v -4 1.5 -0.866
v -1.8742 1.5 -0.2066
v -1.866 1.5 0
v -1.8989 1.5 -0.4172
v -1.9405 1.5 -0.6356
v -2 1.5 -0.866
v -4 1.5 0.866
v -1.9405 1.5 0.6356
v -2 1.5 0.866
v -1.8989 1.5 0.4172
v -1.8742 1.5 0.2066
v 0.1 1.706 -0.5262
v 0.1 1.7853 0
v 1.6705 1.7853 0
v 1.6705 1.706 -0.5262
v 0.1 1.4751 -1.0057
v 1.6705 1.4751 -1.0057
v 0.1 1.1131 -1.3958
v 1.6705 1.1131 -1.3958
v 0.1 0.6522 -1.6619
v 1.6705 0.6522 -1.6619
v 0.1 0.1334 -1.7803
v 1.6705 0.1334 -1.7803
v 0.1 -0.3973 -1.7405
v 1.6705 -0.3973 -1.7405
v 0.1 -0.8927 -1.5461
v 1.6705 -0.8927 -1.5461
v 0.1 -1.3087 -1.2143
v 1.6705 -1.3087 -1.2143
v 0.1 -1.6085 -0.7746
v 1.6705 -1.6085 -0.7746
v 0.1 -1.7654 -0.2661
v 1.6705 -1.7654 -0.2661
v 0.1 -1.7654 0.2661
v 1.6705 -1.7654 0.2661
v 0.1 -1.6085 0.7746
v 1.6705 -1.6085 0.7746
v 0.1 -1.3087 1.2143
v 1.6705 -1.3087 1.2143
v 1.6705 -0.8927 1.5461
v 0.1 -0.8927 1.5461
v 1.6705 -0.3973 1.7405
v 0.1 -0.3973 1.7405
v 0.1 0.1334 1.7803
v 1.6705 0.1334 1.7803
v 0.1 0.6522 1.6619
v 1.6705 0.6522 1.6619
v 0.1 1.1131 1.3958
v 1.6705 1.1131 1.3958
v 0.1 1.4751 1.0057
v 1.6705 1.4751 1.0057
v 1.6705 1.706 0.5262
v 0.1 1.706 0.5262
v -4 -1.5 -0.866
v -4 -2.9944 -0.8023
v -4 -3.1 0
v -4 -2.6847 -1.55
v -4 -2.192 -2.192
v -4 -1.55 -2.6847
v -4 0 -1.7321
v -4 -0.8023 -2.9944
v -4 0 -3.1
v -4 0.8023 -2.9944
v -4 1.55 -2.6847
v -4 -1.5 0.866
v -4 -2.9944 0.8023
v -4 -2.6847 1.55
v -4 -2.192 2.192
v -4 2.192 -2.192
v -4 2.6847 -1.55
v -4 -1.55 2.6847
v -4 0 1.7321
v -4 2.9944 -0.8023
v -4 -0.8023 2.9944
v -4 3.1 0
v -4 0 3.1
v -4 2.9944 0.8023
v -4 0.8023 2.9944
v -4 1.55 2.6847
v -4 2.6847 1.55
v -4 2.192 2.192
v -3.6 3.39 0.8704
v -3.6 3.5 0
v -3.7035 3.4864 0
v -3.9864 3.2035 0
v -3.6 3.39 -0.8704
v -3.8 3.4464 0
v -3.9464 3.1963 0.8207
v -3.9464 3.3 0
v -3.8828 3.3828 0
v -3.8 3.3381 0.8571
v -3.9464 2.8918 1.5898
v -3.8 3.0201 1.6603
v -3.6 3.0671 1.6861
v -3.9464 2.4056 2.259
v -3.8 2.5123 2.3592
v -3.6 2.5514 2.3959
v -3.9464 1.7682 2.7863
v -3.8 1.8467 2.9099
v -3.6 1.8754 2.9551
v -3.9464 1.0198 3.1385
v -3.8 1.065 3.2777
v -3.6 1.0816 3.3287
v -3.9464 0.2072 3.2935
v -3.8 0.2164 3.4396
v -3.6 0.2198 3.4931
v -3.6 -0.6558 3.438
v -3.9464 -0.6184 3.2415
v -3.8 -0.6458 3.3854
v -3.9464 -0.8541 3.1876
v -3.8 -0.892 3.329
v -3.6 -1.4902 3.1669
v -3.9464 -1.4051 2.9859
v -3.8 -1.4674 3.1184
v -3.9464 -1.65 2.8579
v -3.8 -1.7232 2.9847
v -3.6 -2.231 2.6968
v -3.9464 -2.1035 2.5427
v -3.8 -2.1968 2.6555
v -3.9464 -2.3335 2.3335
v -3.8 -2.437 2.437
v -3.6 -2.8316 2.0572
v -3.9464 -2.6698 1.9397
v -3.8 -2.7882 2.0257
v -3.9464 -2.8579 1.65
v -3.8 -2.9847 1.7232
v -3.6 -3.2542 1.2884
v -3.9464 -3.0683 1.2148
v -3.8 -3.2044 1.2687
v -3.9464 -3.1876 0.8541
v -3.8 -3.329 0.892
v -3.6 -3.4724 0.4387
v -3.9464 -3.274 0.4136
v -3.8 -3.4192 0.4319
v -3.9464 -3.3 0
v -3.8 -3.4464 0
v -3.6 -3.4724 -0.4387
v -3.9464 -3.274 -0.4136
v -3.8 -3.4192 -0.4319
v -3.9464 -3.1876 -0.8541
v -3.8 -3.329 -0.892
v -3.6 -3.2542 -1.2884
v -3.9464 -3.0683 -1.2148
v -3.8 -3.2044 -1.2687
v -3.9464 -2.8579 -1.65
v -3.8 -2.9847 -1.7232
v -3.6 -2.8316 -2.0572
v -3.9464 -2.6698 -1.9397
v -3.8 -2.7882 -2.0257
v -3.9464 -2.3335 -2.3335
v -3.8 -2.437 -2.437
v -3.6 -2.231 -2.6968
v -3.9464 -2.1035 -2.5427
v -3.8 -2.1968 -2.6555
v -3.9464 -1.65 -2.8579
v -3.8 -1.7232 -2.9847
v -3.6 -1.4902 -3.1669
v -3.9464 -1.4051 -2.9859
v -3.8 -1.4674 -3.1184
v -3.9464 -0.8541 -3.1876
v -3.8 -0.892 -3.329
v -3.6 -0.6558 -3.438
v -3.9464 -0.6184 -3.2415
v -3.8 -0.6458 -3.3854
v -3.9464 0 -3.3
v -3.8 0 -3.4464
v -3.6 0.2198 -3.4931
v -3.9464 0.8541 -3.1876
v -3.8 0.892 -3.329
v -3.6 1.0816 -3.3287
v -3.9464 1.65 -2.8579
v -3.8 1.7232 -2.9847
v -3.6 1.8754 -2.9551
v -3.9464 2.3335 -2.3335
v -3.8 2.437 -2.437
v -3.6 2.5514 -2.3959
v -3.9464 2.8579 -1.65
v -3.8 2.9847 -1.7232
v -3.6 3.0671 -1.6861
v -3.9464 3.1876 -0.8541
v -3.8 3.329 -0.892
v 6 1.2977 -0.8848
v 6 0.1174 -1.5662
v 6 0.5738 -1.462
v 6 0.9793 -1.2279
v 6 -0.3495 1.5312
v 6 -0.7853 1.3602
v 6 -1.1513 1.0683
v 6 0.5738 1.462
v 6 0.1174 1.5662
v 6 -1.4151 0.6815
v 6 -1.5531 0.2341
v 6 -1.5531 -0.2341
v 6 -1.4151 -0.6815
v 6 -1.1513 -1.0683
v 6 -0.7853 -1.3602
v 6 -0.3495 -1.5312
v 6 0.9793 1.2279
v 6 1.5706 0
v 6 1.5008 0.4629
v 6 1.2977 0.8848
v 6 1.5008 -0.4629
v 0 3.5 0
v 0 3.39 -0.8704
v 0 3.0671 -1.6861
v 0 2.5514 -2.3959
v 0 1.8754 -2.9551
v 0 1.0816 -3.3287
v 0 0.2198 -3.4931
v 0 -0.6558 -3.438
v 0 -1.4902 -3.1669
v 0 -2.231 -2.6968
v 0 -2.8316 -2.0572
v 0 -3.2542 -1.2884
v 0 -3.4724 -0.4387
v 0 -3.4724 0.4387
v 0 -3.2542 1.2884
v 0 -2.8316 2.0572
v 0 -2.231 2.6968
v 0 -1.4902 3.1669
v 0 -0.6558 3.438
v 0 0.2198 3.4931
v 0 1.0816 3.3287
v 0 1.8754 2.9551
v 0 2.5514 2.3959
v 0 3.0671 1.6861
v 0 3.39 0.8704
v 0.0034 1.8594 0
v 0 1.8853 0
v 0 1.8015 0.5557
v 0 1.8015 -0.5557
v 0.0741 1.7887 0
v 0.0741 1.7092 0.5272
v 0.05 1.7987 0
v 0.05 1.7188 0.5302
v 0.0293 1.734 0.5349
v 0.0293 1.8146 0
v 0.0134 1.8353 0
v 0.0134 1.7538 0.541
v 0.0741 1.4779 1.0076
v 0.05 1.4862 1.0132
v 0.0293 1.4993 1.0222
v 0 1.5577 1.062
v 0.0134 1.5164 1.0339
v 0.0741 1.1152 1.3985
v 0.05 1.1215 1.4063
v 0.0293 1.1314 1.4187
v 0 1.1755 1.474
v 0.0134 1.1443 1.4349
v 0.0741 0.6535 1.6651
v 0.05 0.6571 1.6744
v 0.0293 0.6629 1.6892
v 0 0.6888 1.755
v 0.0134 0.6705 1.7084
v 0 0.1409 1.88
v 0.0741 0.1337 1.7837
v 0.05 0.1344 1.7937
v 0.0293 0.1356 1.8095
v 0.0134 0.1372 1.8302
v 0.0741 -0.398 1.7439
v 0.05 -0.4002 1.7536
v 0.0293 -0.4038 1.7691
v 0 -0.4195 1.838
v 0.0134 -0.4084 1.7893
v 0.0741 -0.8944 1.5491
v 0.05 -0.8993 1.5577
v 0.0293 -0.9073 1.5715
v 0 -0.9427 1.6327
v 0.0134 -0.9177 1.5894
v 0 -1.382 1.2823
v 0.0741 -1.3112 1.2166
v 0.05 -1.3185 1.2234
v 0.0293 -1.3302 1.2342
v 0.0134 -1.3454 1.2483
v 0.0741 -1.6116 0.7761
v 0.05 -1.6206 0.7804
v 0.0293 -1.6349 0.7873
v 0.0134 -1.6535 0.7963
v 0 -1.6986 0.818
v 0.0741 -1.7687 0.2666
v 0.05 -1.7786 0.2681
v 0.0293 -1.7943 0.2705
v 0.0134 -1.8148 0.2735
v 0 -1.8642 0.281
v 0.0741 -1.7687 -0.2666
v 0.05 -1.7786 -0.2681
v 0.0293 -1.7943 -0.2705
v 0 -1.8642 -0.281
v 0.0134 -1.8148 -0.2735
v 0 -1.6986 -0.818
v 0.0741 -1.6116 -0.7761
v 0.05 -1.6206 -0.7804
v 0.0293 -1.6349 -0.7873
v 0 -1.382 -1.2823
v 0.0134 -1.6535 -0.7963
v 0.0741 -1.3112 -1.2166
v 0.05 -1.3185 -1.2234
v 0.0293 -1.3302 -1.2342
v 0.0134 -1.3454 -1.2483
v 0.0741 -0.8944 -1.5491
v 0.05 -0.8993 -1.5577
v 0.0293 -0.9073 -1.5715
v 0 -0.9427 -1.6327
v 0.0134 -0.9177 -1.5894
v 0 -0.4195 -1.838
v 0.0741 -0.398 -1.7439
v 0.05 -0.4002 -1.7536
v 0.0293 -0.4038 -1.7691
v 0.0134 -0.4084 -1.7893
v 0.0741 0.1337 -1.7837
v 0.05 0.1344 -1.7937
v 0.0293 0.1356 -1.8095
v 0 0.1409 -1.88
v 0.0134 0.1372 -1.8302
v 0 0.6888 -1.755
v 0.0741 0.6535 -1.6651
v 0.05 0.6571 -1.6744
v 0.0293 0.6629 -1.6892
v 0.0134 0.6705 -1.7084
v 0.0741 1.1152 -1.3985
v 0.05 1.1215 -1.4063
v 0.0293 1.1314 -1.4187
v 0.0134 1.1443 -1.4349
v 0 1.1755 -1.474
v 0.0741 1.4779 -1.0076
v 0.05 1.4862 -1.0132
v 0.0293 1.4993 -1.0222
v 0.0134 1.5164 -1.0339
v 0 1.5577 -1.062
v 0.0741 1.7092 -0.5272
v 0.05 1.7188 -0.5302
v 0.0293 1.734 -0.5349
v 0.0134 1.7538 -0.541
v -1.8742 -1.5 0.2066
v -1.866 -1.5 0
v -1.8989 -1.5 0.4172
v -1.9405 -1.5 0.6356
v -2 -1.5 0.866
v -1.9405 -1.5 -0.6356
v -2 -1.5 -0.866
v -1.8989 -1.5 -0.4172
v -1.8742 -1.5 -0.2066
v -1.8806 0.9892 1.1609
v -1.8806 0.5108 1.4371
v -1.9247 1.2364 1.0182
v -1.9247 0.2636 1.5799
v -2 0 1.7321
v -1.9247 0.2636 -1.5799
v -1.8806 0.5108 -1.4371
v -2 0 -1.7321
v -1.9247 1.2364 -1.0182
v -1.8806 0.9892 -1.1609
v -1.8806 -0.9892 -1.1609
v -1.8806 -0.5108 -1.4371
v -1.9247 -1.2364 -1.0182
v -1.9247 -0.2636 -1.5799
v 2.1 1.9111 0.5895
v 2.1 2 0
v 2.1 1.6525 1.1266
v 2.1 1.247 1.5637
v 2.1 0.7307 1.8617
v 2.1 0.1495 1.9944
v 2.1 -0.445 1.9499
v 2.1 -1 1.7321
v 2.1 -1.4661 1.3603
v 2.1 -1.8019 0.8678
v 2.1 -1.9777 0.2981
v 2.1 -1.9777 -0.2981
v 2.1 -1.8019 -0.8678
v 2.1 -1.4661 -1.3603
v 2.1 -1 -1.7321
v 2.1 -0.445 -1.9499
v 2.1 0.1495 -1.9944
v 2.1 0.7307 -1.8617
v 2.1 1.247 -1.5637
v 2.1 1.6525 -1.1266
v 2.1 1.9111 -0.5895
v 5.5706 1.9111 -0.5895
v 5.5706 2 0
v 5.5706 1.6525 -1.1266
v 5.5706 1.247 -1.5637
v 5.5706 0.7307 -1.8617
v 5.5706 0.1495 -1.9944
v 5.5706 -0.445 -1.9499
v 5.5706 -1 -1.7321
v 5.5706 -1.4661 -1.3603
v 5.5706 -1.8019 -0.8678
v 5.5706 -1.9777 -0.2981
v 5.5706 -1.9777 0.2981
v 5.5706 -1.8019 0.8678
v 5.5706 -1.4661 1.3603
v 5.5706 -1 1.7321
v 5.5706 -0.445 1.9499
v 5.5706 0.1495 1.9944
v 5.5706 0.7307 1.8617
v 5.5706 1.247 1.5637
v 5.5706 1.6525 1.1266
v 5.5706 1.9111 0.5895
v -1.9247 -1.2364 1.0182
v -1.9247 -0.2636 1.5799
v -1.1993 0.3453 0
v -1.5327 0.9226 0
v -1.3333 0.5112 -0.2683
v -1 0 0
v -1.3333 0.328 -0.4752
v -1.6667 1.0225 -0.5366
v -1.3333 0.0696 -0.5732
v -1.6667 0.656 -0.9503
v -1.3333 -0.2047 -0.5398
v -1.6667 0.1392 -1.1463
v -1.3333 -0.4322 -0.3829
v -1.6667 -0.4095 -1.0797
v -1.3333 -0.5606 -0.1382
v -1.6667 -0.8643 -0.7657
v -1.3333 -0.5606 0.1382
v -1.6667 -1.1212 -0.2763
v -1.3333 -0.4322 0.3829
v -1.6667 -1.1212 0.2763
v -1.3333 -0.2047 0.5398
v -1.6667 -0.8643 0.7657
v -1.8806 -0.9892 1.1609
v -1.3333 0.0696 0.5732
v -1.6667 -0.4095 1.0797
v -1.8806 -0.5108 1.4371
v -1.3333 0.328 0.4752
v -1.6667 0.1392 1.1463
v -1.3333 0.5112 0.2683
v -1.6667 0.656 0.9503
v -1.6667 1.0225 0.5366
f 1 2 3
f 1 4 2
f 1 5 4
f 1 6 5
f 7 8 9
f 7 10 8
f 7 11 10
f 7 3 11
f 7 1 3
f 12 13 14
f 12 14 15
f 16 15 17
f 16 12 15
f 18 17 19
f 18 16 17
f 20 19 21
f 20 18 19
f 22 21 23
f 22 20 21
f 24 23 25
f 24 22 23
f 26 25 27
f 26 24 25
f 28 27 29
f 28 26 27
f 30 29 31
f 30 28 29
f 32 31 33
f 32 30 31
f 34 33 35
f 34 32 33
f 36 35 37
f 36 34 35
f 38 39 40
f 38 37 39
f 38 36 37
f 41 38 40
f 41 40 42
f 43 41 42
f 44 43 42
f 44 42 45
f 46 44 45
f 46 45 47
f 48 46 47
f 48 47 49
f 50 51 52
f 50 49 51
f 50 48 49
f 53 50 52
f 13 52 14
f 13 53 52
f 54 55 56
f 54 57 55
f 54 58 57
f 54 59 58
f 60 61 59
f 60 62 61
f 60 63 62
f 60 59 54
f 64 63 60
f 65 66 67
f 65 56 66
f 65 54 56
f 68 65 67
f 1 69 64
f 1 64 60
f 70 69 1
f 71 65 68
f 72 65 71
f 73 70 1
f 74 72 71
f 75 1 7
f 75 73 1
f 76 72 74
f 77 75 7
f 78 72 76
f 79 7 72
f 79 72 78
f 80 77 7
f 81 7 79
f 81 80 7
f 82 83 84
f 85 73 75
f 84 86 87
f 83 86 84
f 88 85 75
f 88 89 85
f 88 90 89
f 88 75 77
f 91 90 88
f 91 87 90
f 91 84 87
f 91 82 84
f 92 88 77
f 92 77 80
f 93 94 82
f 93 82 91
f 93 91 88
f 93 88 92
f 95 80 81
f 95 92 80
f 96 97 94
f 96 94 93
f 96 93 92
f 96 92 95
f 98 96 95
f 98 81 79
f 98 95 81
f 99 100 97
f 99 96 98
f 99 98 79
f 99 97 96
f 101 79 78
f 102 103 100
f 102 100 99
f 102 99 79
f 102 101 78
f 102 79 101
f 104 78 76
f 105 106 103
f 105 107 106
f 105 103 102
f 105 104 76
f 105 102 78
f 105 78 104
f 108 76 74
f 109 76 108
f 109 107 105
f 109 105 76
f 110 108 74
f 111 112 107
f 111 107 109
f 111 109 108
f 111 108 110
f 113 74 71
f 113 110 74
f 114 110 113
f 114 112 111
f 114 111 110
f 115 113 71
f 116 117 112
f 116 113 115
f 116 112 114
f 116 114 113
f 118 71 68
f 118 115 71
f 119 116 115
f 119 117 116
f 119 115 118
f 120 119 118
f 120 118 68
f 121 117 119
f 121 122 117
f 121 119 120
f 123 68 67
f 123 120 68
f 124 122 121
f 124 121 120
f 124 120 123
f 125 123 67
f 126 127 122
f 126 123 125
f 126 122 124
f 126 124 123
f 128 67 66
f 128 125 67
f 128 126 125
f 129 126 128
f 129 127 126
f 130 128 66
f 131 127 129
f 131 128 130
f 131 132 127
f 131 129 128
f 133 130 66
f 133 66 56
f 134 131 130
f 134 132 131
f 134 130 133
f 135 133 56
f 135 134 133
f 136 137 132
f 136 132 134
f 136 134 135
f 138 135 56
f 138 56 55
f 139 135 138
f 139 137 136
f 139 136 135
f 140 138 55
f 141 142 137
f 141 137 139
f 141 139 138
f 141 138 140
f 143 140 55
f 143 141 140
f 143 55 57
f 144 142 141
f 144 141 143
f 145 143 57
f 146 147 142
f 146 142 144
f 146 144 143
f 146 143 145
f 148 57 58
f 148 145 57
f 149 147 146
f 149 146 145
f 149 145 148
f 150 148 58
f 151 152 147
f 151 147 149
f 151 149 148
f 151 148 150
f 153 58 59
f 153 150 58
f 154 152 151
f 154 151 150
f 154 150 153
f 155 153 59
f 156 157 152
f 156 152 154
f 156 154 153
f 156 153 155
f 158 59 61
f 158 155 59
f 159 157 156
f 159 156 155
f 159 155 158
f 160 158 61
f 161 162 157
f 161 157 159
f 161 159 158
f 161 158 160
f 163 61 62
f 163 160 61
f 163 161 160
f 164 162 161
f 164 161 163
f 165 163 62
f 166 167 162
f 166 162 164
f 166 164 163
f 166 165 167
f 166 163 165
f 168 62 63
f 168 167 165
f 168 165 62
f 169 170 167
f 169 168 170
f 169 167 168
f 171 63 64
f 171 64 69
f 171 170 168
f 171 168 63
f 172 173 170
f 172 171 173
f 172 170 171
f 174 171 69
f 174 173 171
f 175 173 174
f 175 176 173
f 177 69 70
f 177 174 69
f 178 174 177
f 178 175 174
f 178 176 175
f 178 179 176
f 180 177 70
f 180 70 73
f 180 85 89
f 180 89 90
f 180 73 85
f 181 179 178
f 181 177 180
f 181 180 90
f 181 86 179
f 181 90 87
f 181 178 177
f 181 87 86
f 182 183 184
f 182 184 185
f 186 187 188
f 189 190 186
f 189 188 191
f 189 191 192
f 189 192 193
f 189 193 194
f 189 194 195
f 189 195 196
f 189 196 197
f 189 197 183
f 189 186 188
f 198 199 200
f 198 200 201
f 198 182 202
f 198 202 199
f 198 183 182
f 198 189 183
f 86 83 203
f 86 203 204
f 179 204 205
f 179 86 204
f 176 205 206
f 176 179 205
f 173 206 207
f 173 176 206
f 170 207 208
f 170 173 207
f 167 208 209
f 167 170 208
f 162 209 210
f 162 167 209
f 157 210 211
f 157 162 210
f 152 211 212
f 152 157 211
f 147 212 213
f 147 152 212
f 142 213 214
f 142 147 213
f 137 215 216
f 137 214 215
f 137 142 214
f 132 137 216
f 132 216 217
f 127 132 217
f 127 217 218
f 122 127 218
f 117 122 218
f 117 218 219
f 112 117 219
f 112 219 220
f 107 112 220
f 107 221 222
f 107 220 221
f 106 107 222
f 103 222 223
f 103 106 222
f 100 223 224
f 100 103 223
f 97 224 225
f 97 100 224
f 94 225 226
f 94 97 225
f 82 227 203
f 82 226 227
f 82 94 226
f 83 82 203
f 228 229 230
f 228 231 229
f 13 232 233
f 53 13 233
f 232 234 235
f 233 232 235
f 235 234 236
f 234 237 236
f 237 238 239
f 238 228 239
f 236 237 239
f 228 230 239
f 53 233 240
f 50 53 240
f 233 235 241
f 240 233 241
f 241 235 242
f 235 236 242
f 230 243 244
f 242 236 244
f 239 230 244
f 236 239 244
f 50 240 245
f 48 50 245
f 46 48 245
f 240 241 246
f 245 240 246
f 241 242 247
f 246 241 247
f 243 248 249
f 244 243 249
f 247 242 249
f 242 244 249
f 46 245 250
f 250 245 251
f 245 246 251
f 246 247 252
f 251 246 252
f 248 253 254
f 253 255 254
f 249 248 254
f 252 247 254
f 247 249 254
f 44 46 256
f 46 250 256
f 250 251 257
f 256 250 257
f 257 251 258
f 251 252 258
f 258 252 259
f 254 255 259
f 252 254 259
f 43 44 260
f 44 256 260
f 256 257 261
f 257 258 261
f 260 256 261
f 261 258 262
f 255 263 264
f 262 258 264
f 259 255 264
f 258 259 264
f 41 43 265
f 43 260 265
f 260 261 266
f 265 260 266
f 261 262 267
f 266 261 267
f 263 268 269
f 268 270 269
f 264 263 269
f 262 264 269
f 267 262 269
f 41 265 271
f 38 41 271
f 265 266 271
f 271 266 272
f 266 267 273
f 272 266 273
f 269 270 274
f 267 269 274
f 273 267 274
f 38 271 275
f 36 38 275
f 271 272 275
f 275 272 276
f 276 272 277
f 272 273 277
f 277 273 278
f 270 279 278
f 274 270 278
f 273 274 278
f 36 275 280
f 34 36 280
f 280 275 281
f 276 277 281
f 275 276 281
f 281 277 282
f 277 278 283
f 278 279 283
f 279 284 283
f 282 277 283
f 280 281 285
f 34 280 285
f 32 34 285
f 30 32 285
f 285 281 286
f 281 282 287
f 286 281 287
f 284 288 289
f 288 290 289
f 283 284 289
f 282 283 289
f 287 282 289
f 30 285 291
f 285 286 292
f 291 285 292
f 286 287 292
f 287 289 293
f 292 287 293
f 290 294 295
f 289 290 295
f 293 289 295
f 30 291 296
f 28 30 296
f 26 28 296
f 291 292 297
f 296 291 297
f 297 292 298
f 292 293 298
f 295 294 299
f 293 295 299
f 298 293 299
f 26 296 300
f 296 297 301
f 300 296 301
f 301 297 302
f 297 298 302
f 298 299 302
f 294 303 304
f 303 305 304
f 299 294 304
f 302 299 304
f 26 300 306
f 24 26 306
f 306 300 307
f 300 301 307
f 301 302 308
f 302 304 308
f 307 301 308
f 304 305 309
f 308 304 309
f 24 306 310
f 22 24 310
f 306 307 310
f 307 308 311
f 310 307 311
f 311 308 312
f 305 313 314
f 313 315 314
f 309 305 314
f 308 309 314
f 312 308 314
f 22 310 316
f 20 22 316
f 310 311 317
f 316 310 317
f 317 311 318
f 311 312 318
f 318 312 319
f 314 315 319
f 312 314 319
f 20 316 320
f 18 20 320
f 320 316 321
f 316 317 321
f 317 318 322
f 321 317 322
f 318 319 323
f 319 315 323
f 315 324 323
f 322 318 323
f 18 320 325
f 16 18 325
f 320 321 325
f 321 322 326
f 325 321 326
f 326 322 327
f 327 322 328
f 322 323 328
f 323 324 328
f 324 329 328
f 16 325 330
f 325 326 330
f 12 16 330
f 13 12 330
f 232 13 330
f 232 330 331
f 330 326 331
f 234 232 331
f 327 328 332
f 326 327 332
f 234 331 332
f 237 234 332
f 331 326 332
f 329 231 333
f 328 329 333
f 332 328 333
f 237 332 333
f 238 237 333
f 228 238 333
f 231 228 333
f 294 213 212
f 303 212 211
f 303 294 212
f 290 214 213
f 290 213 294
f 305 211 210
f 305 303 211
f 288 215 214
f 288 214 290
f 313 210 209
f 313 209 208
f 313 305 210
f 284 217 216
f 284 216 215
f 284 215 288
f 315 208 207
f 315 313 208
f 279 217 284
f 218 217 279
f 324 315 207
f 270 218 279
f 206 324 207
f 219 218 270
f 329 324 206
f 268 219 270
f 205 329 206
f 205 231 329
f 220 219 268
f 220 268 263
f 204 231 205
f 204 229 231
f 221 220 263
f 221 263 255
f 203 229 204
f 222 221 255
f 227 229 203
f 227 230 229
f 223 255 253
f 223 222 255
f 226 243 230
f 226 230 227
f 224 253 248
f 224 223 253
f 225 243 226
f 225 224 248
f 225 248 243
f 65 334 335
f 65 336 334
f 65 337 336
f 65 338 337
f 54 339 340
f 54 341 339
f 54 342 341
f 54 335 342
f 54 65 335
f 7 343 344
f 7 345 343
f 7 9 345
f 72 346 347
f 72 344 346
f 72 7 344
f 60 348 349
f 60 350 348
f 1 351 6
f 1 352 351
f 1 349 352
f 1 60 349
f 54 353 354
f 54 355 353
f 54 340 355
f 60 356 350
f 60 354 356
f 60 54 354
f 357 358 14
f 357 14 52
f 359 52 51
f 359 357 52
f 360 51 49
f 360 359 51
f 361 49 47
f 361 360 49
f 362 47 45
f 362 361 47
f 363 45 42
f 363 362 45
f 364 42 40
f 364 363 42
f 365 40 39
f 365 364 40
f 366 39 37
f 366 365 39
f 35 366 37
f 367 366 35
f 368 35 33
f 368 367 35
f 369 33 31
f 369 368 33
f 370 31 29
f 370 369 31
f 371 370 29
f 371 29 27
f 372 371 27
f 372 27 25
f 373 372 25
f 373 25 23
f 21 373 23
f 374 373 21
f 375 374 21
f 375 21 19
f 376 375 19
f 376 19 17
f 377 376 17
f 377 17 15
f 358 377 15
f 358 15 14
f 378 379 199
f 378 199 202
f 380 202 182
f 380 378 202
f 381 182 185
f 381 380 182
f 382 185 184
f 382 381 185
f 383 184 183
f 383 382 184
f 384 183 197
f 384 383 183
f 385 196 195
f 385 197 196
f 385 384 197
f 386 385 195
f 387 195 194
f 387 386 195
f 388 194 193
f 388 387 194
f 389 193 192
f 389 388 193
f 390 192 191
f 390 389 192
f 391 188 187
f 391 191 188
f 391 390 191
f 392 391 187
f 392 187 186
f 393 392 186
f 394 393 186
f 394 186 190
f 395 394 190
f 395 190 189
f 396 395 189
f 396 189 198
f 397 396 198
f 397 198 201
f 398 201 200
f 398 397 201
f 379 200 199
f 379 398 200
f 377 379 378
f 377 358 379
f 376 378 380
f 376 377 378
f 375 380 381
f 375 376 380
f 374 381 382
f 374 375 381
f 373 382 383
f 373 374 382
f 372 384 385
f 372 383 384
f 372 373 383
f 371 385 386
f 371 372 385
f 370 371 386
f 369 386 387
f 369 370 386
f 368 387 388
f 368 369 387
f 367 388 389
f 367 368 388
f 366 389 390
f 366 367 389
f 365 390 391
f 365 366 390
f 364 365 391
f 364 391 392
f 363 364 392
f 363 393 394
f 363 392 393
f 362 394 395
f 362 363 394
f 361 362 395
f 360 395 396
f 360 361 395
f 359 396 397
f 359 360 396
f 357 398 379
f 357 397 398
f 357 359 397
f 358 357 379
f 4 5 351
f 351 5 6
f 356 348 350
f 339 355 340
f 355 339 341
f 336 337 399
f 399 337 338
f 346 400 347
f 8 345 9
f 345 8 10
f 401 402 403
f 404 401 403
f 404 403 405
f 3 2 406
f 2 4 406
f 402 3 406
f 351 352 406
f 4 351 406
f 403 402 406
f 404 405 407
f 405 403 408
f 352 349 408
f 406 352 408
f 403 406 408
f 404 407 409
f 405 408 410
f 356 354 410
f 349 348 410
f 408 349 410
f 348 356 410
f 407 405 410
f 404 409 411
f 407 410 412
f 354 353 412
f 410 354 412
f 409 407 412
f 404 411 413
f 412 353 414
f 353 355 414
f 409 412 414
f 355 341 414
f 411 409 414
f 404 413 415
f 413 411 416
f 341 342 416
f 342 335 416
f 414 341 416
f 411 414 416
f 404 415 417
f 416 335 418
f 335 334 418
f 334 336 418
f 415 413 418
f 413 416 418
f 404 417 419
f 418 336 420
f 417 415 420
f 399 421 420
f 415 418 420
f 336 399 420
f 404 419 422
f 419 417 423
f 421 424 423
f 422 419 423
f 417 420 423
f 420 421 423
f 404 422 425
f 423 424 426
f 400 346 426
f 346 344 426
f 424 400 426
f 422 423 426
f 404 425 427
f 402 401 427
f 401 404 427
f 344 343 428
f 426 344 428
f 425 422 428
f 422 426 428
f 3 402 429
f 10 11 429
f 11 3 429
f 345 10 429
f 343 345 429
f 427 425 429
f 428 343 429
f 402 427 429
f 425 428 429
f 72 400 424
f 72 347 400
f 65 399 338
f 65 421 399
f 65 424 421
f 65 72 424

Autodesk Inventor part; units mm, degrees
ref_plane "YZ Plane" through (0, 0, 0) normal (1, 0, 0) x (0, 1, 0)
ref_plane "XZ Plane" through (0, 0, 0) normal (0, 1, 0) x (-1, 0, 0)
sketch "Эскиз1" plane through (0, 0, 0) normal (0, 0, 1) x (1, 0, 0)
  line L0 (-1, 0) -> (6, 0)
  line L1 (6, 0) -> (6, 2)
  line L2 (6, 2) -> (2.1, 2)
  line L3 (2.1, 2) -> (1.6705, 1.7853)
  line L4 (1.6705, 1.7853) -> (0, 1.7853)
  line L5 (0, 1.7853) -> (0, 3.5)
  line L6 (0, 3.5) -> (-4, 3.5)
  line L7 (-4, 3.5) -> (-4, 1.7321)
  line L8 (-4, 1.7321) -> (-2, 1.7321)
  line L9 (-2, 1.7321) -> (-1, 0)
  line L10 (-6, 0) -> (8, 0) projected
  line L11 (0, -0.7) -> (0, 4.2) projected
  line L12 (2.1, 2) -> (0, 2) construction
  dimension "d1" = 3.9
  dimension "d2" = 0.4295
  dimension "d3" = 4
  dimension "d4" = 2
  dimension "d5" = 60
  dimension "d6" = 4
  dimension "d7" = 3.5705
  dimension "d8" = 3.4641
  dimension "d9" = 7
  dimension "d26" = 6
revolve "Базовый элемент" add sketch "Эскиз1" angle 360 about axis through (-1, 0, 0) along (1, 0, 0)
sketch "Эскиз2" plane through (-4, 0, 0) normal (-1, 0, 0) x (0, 0, 1)
  circle A0 centre (0, 0) radius 1.7321 projected
  line L0 (0, -4.9) -> (0, 4.9) projected
  line L1 (-4.9, 0) -> (4.9, 0) projected
  line L2 (1.7321, 0) -> (0.866, -1.5)
  line L3 (0.866, -1.5) -> (-0.866, -1.5)
  line L4 (-0.866, -1.5) -> (-1.7321, 0)
  line L5 (-1.7321, 0) -> (-0.866, 1.5)
  line L6 (-0.866, 1.5) -> (0.866, 1.5)
  line L7 (0.866, 1.5) -> (1.7321, 0)
extrude "Паз" add sketch "Эскиз2" against normal up to next contours L7 A0 | A0 L2 | L6 L0 A0 | A0 L0 L3 | L0 L6 A0 | A0 L3 L0 | L4 A0 | A0 L5
fillet "Сопряжение1" radius 0.4 1 edges at (-4, -3.5, 0)
thread "Резьба" size "M4x0.7" class "6g" standard "ISO Metric profile" length 3.9
chamfer "Фаска1" distance 0.4294 distance2 0.4294 1 edges at (6, -2, 0) measured on face at (6, 0.556, 0.0273)
ref_plane "Work Plane1" through (29, 0, 0) normal (0, -1, 0) x (1, 0, 0)
fillet "Fillet2" radius 0.1 1 edges at (0, -1.7853, 0)
equation "\"d1\" = GEL"
equation "\"d3\" = KOH"
equation "\"d4\" = INTI"
equation "\"d6\" = GD"
equation "\"d7\" = BDM"
equation "\"d8\" = 1.1547 * SW"
equation "\"d9\" = KOD"
equation "\"d26\" = NLG"
equation "\"d30\" = R"
equation "\"d17\" = RR"
equation "\"d13\" = GEL"
equation "\"d15\" = -0.5 * SPD + 0.5 * GD"
equation "\"d16\" = GUL"
equation "\"GD\" = NND"
equation "\"NLG\" = 6"
equation "\"GEL\" = 3.9"
equation "\"KOD\" = 7"
equation "\"KOH\" = NND"
equation "\"INTI\" = 2"
equation "\"GAL\" = 0.61345 * PTC"
equation "\"GUL\" = 0.61345 * PTC"
equation "\"BDM\" = 3.5705"
equation "\"SW\" = 3"
equation "\"RR\" = 0.4"
equation "\"SPD\" = NND - 1.2269 * PTC"
equation "\"R\" = 0.1"
equation "\"PHH\" = 0.4"
equation "\"GD1\" = THREADDIA - 1.2269 * PTC"
equation "\"THREADDIA\" = 4"
equation "\"FAWI\" = 45deg"
equation "\"PTC\" = 0.7"
equation "\"NND\" = 4"
equation "\"TOA\" = 30deg"
equation "\"E0\" = 1.155 * SW"
properties part number "CSN 02 1143 - M4 x 6" material "Сталь, мягкая"
